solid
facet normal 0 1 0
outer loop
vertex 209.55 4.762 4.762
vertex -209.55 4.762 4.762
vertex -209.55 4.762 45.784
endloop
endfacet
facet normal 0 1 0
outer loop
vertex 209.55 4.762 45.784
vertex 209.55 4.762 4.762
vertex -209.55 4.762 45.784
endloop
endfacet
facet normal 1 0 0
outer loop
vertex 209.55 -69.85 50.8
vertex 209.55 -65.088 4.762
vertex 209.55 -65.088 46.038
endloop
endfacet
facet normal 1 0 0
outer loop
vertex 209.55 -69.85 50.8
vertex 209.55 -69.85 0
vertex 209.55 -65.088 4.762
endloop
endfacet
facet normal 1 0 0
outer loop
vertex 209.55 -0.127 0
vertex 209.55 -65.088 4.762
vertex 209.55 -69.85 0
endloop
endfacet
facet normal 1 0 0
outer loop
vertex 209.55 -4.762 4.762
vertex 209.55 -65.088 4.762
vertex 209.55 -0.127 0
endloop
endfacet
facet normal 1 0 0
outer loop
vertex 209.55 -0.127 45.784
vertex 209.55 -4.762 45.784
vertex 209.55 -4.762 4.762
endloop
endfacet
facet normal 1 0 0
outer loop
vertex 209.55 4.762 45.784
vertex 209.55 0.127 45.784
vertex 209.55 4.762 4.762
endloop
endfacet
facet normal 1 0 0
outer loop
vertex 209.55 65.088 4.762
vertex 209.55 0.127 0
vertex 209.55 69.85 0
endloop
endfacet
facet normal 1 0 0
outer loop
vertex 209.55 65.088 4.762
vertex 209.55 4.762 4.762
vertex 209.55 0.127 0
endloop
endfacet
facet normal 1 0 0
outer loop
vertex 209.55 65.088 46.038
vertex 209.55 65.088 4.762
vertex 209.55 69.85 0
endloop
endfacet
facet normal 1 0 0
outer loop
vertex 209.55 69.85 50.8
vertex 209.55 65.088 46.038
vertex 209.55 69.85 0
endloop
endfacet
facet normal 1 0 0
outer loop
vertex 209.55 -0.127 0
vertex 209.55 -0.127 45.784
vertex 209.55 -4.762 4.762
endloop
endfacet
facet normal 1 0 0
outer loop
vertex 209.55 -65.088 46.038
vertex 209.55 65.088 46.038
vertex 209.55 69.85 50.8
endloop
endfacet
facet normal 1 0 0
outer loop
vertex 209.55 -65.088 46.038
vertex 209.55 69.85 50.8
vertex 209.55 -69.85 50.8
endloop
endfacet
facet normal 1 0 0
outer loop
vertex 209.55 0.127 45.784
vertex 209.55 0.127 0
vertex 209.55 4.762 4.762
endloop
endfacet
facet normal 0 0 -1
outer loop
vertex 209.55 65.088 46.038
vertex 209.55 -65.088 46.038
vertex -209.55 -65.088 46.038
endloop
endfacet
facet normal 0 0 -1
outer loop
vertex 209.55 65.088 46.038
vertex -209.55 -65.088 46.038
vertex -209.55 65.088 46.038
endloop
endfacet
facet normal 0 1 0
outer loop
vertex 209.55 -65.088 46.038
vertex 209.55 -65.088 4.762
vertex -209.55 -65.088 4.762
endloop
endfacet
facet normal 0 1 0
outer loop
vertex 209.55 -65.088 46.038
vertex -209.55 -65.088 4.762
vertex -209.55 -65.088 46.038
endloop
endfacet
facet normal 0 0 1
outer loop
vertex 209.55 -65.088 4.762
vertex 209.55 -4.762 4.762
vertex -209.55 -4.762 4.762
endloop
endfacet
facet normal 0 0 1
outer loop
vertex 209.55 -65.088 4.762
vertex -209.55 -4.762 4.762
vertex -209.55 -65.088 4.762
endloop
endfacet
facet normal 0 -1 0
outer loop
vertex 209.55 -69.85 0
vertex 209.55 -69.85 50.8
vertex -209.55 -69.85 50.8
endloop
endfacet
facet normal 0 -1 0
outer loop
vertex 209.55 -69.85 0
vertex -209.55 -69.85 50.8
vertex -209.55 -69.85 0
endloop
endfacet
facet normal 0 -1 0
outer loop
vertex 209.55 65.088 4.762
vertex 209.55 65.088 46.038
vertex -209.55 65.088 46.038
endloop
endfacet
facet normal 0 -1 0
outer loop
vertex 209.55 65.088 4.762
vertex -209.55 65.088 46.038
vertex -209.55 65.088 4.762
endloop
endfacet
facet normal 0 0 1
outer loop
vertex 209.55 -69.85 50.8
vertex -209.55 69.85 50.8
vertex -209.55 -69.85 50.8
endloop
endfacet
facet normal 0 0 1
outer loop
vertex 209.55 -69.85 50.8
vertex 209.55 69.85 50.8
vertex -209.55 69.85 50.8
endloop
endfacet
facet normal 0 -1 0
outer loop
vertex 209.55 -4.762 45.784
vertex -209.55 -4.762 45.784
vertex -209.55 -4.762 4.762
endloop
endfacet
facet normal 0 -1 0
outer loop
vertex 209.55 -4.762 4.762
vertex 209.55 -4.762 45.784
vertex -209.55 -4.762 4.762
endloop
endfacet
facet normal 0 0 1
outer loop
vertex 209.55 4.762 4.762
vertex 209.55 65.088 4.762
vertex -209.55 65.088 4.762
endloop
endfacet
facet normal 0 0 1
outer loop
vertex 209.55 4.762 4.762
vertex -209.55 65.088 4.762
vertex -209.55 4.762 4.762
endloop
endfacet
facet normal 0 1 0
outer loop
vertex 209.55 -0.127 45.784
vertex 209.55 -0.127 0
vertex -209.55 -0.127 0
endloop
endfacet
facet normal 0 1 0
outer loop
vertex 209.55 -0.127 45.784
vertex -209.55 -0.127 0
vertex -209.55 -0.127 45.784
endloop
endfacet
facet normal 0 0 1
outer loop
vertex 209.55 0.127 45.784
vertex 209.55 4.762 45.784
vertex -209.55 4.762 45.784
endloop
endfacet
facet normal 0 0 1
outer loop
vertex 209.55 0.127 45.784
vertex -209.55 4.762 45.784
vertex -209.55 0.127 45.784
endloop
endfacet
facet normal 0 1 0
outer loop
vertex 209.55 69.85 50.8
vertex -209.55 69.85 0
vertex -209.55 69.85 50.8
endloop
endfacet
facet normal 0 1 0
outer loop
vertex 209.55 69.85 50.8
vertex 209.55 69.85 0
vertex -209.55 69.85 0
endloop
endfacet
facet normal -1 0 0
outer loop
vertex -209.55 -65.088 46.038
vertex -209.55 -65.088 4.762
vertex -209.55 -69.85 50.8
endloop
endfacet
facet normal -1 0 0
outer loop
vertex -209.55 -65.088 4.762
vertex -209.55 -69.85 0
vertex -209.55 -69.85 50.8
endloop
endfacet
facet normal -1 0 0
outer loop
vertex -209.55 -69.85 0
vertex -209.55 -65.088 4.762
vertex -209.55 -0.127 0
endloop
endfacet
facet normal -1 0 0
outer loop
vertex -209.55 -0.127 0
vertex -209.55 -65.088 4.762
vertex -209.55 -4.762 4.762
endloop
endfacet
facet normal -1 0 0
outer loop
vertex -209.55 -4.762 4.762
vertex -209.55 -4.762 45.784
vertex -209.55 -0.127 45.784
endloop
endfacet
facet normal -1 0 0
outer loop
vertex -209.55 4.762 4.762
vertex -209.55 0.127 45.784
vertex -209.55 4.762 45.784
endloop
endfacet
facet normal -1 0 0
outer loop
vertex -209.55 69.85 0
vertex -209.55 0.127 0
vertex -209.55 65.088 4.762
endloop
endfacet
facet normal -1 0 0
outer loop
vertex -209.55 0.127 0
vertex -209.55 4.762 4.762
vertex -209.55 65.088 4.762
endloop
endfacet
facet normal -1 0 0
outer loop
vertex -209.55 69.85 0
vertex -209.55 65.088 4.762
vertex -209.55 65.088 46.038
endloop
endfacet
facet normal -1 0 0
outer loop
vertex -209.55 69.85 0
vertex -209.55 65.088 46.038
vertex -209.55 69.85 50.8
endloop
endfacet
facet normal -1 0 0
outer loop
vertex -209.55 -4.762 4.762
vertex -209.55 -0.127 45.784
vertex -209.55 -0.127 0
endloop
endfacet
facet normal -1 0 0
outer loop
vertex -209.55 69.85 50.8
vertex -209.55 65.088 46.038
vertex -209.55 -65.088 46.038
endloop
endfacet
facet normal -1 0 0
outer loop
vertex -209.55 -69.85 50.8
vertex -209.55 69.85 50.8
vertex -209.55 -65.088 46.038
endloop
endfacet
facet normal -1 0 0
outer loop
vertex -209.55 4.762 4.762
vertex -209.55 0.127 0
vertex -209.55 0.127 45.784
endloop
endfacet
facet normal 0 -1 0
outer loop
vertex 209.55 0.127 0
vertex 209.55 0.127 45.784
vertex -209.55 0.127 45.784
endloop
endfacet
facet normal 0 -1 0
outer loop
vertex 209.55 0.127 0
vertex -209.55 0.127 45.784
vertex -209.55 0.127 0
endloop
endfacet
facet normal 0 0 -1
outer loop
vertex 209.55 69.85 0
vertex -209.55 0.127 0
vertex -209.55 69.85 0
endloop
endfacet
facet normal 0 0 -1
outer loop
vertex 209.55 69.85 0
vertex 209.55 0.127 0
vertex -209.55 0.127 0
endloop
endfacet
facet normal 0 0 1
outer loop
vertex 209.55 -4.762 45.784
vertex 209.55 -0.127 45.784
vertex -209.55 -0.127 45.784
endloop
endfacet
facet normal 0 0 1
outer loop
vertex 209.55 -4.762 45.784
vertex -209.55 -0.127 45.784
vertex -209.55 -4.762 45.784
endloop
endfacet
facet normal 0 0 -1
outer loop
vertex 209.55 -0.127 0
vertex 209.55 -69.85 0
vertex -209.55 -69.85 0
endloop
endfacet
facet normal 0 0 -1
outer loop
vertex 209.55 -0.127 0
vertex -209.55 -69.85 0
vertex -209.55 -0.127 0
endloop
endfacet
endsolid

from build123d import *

# Parameters (mm, degrees)
F1_DEPTH = 209.55


with BuildPart() as f1:
    # F0 (on Right) → F1 (new body, symmetric)
    with BuildSketch(Plane.YZ):
        Polygon((69.85, 50.8), (-69.85, 50.8), (-69.85, 0), (-0.127, 0), (-0.127, 45.7835), (-4.7625, 45.7835), (-4.7625, 4.7625), (-65.0875, 4.7625), (-65.0875, 46.0375), (65.0875, 46.0375), (65.0875, 4.7625), (4.7625, 4.7625), (4.7625, 45.7835), (0.127, 45.7835), (0.127, 0), (69.85, 0), align=None)
    extrude(amount=F1_DEPTH, both=True)


solid = f1.part
